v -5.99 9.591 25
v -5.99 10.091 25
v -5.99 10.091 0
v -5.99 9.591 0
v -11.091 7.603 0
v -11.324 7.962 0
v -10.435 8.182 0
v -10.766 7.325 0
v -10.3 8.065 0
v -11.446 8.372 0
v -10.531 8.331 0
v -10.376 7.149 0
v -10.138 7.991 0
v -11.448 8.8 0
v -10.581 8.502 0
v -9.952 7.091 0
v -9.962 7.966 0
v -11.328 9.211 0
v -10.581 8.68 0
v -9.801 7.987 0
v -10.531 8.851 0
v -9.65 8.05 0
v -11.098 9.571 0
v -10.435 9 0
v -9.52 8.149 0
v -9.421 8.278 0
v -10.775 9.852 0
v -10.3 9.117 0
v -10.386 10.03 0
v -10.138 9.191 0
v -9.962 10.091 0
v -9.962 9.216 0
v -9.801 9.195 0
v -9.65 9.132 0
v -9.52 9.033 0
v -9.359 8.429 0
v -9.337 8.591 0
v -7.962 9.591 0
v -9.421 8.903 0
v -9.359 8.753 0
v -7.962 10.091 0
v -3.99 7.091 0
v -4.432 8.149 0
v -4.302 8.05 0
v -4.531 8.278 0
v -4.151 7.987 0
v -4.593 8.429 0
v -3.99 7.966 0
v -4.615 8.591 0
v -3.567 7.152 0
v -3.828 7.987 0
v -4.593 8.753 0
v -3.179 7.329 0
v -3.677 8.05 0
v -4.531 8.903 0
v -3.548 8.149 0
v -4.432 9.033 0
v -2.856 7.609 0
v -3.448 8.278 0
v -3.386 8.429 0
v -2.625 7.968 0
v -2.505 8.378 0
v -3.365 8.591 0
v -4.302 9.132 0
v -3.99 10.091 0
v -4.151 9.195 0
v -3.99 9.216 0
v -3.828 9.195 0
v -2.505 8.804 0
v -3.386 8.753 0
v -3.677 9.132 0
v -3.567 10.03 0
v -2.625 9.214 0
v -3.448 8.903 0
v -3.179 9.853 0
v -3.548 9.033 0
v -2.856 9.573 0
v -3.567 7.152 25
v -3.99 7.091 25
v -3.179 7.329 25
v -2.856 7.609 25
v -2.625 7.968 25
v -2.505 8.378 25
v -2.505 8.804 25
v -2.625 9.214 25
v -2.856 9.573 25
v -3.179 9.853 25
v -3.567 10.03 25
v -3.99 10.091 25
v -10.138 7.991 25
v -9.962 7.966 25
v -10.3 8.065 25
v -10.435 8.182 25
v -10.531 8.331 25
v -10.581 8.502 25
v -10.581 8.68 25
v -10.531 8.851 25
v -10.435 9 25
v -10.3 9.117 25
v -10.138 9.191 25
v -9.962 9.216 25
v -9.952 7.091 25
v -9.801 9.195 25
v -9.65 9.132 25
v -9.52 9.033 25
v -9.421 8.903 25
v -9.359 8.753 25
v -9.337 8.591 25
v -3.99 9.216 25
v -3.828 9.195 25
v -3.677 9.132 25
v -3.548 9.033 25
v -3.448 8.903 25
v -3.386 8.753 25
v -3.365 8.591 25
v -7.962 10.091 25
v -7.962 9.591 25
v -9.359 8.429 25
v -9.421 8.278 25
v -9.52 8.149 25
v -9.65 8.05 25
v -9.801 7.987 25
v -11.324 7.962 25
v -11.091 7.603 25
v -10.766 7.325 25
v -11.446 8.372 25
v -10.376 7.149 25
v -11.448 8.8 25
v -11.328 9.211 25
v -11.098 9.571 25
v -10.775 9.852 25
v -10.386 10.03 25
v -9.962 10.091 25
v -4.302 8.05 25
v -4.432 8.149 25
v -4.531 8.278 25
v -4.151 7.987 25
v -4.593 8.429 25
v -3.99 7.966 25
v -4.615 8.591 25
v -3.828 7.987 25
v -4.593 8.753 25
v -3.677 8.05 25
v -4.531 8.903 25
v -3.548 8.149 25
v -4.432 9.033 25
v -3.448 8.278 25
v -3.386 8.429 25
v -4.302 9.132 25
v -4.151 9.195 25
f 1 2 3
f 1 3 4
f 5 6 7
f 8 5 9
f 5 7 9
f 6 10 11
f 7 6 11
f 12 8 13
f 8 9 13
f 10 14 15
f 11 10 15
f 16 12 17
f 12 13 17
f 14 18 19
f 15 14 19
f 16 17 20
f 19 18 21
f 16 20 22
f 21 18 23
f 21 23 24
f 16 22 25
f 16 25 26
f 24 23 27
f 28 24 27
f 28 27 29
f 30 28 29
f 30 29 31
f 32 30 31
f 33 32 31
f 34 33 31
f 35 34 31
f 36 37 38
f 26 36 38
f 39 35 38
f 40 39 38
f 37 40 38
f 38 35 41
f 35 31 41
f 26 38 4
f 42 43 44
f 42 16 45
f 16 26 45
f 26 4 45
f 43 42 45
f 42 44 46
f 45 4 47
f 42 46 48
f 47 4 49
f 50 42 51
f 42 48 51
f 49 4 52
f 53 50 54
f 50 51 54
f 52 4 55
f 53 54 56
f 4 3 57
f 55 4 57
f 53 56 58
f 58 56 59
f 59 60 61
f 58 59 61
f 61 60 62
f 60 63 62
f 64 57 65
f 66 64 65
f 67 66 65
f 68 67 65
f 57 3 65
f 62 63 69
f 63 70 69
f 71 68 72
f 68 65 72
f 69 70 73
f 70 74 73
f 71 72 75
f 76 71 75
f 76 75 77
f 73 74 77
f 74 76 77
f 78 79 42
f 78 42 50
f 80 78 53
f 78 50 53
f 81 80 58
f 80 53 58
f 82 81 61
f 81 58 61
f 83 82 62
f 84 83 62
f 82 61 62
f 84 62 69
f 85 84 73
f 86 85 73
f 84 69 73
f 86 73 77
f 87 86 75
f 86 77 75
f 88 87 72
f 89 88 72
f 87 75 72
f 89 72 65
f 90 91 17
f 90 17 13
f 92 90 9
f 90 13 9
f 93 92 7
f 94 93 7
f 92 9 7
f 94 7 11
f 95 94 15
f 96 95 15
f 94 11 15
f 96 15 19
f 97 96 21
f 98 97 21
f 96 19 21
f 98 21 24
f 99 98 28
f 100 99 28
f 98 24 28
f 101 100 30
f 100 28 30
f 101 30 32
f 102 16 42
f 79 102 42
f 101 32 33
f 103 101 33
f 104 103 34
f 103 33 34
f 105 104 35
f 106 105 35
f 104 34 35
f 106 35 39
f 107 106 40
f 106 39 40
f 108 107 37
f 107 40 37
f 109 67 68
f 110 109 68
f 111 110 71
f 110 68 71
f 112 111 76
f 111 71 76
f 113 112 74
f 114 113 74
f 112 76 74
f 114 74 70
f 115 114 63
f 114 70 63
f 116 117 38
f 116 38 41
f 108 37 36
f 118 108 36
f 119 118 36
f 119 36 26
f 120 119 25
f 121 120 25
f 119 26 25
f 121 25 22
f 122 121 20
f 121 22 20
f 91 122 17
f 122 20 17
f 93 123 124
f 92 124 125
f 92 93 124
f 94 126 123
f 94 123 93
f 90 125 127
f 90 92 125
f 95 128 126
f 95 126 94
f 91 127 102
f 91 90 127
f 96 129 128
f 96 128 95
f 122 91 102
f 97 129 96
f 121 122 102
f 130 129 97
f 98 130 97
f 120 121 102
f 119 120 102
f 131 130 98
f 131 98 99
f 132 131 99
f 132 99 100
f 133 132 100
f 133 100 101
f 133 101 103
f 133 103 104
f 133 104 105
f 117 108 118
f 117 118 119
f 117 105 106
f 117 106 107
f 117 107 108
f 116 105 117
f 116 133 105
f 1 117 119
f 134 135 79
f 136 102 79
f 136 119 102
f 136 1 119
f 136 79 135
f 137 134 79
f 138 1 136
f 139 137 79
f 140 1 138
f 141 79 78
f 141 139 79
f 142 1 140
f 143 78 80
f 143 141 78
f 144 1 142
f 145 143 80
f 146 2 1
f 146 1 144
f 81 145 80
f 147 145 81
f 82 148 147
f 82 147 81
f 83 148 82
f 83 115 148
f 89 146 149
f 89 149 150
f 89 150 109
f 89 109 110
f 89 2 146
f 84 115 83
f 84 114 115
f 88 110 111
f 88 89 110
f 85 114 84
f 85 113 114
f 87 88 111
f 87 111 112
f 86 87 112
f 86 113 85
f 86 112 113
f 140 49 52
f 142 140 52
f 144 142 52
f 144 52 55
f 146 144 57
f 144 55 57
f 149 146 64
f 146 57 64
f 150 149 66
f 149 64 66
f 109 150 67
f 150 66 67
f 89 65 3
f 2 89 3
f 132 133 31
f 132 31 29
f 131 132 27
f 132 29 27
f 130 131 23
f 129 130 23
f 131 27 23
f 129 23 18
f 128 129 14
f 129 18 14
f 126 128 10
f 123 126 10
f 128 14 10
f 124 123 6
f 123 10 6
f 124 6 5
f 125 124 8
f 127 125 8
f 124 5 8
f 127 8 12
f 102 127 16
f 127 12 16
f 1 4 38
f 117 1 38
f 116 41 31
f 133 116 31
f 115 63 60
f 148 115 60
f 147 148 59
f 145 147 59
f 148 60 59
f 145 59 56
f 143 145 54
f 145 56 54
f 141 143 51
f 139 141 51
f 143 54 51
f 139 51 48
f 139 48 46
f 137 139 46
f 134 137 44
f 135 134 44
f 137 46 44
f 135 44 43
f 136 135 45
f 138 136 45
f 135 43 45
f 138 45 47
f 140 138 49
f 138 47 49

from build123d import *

# Parameters (mm, degrees)
F1_DEPTH = 25


with BuildPart() as f1:
    # F0 (on Top) → F1 (new body)
    with BuildSketch(Plane.XY):
        with BuildLine():
            Line((-4.614562, 8.590986), (-9.337365, 8.590986))
            ThreePointArc((-9.337365, 8.590986), (-9.520423, 8.149044), (-9.962365, 7.965986))
            Line((-9.962365, 7.965986), (-9.962365, 7.518355))
            Line((-9.962365, 7.518355), (-9.952076, 7.091021))
            Line((-9.952076, 7.091021), (-3.989562, 7.091021))
            Line((-3.989562, 7.091021), (-3.989562, 7.965986))
            ThreePointArc((-3.989562, 7.965986), (-4.431504, 8.149044), (-4.614562, 8.590986))
        make_face()
        with BuildLine():
            ThreePointArc((-9.962365, 9.215986), (-9.520423, 9.032927), (-9.337365, 8.590986))
            Line((-9.337365, 8.590986), (-4.614562, 8.590986))
            ThreePointArc((-4.614562, 8.590986), (-4.431504, 9.032927), (-3.989562, 9.215986))
            Line((-3.989562, 9.215986), (-3.989562, 10.090986))
            Line((-3.989562, 10.090986), (-5.989562, 10.090986))
            Line((-5.989562, 10.090986), (-5.989562, 9.590986))
            Line((-5.989562, 9.590986), (-7.962365, 9.590986))
            Line((-7.962365, 9.590986), (-7.962365, 10.090986))
            Line((-7.962365, 10.090986), (-9.962365, 10.090986))
            Line((-9.962365, 10.090986), (-9.962365, 9.215986))
        make_face()
        with BuildLine():
            ThreePointArc((-9.962365, 7.965986), (-10.587365, 8.590986), (-9.962365, 9.215986))
            Line((-9.962365, 9.215986), (-9.962365, 10.090986))
            ThreePointArc((-9.962365, 10.090986), (-11.462356, 8.585842), (-9.952076, 7.091021))
            Line((-9.952076, 7.091021), (-9.962365, 7.518355))
            Line((-9.962365, 7.518355), (-9.962365, 7.965986))
        make_face()
        with BuildLine():
            Line((-3.989562, 10.090986), (-3.989562, 9.215986))
            ThreePointArc((-3.989562, 9.215986), (-3.547621, 9.032927), (-3.364562, 8.590986))
            ThreePointArc((-3.364562, 8.590986), (-3.547621, 8.149044), (-3.989562, 7.965986))
            Line((-3.989562, 7.965986), (-3.989562, 7.091021))
            ThreePointArc((-3.989562, 7.091021), (-2.48958, 8.591003), (-3.989562, 10.090986))
        make_face()
    extrude(amount=F1_DEPTH)


solid = f1.part
